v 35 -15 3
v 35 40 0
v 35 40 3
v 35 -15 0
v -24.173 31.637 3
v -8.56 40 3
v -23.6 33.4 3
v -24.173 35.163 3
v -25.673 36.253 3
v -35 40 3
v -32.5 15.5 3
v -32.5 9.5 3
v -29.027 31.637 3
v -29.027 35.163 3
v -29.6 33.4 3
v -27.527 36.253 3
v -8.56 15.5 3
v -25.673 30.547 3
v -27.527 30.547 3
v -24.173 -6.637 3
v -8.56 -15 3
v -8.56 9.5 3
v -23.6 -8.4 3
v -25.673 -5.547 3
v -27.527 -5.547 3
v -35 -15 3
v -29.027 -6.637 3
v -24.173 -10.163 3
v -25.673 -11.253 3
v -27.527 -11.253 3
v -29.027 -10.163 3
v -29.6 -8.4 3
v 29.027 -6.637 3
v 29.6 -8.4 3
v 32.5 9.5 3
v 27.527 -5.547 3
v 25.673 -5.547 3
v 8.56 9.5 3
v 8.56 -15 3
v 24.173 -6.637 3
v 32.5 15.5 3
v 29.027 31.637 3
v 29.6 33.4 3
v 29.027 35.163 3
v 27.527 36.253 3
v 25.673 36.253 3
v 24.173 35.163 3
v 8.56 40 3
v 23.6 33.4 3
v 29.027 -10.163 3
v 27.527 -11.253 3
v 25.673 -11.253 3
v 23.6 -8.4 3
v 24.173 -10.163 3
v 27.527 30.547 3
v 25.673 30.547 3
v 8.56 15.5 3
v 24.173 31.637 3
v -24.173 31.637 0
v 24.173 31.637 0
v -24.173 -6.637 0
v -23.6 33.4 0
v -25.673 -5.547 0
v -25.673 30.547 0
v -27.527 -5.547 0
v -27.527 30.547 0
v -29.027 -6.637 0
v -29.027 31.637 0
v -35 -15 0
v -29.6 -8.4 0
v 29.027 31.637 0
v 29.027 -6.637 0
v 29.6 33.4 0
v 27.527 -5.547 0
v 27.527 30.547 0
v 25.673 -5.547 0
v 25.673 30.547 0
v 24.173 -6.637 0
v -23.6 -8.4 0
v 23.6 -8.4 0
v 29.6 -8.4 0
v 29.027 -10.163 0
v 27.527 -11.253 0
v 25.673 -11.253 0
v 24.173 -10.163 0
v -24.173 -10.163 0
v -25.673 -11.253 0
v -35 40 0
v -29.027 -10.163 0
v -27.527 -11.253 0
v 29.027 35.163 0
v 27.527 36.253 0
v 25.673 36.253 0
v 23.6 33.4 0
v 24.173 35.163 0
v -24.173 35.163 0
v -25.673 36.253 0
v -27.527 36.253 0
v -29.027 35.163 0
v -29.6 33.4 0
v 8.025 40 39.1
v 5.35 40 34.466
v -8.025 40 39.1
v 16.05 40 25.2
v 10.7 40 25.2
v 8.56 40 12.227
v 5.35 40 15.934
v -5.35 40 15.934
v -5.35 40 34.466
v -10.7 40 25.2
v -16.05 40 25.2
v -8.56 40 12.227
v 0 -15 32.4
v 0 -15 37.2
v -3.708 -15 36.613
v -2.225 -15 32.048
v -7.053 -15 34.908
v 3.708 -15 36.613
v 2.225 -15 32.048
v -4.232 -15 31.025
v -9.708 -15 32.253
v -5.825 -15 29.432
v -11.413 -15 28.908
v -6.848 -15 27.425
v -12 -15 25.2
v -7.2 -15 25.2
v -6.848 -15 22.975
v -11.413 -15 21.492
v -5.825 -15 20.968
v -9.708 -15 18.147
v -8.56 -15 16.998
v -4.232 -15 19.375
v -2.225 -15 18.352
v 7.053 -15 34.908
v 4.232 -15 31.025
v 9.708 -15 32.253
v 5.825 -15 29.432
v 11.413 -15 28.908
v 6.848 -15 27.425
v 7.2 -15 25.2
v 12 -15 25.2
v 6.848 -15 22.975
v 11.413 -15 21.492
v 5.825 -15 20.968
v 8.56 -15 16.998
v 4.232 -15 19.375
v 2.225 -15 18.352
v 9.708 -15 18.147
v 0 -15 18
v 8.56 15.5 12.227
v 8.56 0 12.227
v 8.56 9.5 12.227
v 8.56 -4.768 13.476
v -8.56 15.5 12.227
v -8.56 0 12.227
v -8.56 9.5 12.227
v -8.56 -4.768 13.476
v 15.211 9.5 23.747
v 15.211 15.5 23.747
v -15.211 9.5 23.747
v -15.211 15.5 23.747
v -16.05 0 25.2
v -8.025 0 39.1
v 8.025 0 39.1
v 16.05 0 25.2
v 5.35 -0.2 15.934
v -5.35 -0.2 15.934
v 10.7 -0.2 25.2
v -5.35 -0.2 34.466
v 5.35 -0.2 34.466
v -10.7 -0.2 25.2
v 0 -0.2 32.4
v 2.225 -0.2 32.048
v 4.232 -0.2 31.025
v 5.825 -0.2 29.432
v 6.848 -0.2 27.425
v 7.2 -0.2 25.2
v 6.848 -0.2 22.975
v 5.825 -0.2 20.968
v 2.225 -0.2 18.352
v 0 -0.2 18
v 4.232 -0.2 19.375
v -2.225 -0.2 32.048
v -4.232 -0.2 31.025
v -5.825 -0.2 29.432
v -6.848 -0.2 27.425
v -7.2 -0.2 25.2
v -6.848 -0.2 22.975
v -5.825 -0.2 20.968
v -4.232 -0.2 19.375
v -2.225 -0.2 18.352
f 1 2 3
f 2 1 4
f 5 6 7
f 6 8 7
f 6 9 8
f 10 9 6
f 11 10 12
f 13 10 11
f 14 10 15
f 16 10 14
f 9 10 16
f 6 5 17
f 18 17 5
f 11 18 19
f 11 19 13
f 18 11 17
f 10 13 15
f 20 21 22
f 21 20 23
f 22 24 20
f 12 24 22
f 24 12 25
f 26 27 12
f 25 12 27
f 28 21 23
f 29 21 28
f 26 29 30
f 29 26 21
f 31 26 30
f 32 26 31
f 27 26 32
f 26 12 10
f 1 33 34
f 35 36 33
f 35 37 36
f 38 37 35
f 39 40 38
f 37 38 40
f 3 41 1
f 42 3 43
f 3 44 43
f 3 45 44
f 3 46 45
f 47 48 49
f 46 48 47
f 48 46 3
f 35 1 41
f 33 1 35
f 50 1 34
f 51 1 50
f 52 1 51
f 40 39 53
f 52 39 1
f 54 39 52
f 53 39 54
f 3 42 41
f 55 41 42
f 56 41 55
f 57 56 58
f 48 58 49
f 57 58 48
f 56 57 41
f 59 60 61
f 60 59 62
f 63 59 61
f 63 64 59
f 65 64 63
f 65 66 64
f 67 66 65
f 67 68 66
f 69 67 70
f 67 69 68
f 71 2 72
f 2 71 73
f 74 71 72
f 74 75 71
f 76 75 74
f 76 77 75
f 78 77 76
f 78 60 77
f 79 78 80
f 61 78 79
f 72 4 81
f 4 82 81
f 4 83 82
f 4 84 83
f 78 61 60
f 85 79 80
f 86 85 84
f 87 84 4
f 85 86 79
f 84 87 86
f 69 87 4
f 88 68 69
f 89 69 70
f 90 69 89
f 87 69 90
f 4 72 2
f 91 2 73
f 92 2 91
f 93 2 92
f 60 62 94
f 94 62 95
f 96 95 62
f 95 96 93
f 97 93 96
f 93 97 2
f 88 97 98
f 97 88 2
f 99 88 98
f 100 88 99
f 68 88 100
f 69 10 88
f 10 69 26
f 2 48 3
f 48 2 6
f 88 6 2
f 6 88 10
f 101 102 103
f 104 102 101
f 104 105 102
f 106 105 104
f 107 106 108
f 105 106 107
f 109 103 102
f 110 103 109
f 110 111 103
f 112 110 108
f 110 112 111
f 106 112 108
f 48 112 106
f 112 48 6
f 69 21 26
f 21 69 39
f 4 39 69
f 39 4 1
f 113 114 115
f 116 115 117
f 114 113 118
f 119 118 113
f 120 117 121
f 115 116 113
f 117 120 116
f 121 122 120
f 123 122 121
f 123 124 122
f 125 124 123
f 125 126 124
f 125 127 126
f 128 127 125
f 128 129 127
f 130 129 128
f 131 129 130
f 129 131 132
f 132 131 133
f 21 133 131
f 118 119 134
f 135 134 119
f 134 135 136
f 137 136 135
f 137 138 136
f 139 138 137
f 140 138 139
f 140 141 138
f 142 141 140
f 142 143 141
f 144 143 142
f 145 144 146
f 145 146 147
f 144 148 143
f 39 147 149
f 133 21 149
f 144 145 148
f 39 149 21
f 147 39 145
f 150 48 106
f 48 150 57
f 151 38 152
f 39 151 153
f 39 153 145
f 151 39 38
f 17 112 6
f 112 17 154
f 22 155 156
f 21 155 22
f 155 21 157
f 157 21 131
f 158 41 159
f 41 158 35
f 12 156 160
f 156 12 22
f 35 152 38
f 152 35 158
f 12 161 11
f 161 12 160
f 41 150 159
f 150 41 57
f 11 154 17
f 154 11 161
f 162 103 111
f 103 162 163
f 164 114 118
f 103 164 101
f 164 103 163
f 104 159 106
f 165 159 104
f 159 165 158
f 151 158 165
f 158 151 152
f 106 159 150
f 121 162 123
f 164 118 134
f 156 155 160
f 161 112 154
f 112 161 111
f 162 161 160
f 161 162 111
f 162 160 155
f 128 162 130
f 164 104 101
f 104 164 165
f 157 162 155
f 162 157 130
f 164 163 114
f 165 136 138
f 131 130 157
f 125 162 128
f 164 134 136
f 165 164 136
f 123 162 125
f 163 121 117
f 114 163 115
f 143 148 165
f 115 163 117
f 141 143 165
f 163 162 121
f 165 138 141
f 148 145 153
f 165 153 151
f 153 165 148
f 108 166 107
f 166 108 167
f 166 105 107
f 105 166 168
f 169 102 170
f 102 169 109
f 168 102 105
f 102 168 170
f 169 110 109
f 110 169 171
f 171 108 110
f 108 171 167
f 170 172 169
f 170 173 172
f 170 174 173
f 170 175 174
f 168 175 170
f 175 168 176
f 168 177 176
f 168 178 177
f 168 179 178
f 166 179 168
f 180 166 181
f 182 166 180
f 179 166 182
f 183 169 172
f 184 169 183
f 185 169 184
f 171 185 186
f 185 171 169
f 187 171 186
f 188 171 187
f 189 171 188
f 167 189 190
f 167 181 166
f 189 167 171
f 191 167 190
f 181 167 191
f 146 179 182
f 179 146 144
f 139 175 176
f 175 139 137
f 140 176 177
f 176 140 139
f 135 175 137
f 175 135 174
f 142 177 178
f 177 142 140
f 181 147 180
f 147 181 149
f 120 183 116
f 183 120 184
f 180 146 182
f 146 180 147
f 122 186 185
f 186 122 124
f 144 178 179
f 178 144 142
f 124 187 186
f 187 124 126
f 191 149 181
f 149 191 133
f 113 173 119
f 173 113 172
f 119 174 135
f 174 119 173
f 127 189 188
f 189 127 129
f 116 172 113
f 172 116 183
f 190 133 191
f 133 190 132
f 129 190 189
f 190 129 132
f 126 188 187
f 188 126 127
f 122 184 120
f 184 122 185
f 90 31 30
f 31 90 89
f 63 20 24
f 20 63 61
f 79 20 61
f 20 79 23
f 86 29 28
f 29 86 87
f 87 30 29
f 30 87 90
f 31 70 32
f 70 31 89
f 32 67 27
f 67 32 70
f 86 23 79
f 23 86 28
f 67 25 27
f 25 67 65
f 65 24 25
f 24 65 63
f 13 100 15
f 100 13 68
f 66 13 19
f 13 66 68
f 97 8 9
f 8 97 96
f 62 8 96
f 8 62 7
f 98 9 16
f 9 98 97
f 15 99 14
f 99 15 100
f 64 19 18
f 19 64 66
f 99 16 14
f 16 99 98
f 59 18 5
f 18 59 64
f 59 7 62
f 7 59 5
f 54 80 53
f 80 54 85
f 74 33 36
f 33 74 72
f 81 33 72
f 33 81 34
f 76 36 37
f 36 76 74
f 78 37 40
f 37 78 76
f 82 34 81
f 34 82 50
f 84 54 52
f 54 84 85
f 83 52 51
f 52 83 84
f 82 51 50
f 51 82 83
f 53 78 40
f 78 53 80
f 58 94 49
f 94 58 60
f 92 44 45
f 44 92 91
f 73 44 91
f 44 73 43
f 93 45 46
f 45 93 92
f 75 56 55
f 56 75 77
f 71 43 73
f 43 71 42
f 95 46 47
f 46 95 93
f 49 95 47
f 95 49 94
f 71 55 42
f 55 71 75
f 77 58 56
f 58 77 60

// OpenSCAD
// pieza cnc para unir eje Y con la varilla roscada anti-backslash

dcilindro = 12;  // radio varilla de 12
ycilindro = 15;  // largo zona cilindro   <<< esto es estetico
dtuerca = 21.4;  // radio de una tuerca de 12
ytuerca = 40;    // largo zona tuerca     <<< esto es medida 2 tuercas + resorte con la compresion que se quiera

xtotal = 70;   // ancho pieza
ytotal = ytuerca + ycilindro; // largo pieza
ydescentre = ytuerca/2 - ycilindro/2; // offset largo
zbase = 3;  // alto base pieza

zvarilla = 25.2; // separacion del centro de la varilla al suelo

xpegote = dtuerca * 0.8;  // ancho del cube que pega el elemento con la base cilindro

dagujeros = 6;   // diametro agujeros en el suelo
fagujeros = 0.12; // factor de pegado al borde de los agujeros (entre 0-0.25)

module elemento_solido() {
    hull() {
        translate([0, 0, -ytuerca/2]) 
            cylinder(d=dtuerca*1.5, h=ytuerca, $fn=6, center=true);
        translate([0, 0, ycilindro/2]) 
            cylinder(d=dcilindro*2, h=ycilindro, $fn=20, center=true);
    }
}

module elemento_agujero() {
    translate([0, 0, -ytuerca/2]) 
        cylinder(d=dtuerca, h=ytuerca*1.01, $fn=6, center=true);
    translate([0, 0, ycilindro/2]) 
        cylinder(d=dcilindro*1.2, h=ycilindro*1.01, $fn=20, center=true);
}

difference() {
    union() {
        translate([0, ydescentre, 0]) {
            // la base plana
            translate([0, 0, zbase/2]) 
                cube([xtotal, ytotal, zbase], center=true);
            // el pegote
            translate([0, 0, zvarilla/2]) 
                cube([xpegote, ytotal, zvarilla], center=true);
            // el triangulo
            rotate([90, 0, 0])
                linear_extrude(zbase*2, center=true) 
                    polygon([[-xtotal/2, 0], [-xtotal*0.2, zvarilla], [xtotal*0.2, zvarilla], [xtotal/2, 0]]);
        }
        // el elemento
        translate([0, 0, zvarilla])
            rotate([90, 0, 0]) 
                elemento_solido();
    }
    // el agujero del elemento
    translate([0, 0, 25.2])
        rotate([90, 0, 0]) 
            elemento_agujero();
    // los agujeros en la base
    for (x=[fagujeros, 1-fagujeros])
        for (y=[fagujeros, 1-fagujeros]) 
            translate([(x-0.5)*xtotal, (y-0.5)*ytotal+ydescentre, zbase/2]) 
                cylinder(d=dagujeros, h=zbase*1.01, center=true);
}
